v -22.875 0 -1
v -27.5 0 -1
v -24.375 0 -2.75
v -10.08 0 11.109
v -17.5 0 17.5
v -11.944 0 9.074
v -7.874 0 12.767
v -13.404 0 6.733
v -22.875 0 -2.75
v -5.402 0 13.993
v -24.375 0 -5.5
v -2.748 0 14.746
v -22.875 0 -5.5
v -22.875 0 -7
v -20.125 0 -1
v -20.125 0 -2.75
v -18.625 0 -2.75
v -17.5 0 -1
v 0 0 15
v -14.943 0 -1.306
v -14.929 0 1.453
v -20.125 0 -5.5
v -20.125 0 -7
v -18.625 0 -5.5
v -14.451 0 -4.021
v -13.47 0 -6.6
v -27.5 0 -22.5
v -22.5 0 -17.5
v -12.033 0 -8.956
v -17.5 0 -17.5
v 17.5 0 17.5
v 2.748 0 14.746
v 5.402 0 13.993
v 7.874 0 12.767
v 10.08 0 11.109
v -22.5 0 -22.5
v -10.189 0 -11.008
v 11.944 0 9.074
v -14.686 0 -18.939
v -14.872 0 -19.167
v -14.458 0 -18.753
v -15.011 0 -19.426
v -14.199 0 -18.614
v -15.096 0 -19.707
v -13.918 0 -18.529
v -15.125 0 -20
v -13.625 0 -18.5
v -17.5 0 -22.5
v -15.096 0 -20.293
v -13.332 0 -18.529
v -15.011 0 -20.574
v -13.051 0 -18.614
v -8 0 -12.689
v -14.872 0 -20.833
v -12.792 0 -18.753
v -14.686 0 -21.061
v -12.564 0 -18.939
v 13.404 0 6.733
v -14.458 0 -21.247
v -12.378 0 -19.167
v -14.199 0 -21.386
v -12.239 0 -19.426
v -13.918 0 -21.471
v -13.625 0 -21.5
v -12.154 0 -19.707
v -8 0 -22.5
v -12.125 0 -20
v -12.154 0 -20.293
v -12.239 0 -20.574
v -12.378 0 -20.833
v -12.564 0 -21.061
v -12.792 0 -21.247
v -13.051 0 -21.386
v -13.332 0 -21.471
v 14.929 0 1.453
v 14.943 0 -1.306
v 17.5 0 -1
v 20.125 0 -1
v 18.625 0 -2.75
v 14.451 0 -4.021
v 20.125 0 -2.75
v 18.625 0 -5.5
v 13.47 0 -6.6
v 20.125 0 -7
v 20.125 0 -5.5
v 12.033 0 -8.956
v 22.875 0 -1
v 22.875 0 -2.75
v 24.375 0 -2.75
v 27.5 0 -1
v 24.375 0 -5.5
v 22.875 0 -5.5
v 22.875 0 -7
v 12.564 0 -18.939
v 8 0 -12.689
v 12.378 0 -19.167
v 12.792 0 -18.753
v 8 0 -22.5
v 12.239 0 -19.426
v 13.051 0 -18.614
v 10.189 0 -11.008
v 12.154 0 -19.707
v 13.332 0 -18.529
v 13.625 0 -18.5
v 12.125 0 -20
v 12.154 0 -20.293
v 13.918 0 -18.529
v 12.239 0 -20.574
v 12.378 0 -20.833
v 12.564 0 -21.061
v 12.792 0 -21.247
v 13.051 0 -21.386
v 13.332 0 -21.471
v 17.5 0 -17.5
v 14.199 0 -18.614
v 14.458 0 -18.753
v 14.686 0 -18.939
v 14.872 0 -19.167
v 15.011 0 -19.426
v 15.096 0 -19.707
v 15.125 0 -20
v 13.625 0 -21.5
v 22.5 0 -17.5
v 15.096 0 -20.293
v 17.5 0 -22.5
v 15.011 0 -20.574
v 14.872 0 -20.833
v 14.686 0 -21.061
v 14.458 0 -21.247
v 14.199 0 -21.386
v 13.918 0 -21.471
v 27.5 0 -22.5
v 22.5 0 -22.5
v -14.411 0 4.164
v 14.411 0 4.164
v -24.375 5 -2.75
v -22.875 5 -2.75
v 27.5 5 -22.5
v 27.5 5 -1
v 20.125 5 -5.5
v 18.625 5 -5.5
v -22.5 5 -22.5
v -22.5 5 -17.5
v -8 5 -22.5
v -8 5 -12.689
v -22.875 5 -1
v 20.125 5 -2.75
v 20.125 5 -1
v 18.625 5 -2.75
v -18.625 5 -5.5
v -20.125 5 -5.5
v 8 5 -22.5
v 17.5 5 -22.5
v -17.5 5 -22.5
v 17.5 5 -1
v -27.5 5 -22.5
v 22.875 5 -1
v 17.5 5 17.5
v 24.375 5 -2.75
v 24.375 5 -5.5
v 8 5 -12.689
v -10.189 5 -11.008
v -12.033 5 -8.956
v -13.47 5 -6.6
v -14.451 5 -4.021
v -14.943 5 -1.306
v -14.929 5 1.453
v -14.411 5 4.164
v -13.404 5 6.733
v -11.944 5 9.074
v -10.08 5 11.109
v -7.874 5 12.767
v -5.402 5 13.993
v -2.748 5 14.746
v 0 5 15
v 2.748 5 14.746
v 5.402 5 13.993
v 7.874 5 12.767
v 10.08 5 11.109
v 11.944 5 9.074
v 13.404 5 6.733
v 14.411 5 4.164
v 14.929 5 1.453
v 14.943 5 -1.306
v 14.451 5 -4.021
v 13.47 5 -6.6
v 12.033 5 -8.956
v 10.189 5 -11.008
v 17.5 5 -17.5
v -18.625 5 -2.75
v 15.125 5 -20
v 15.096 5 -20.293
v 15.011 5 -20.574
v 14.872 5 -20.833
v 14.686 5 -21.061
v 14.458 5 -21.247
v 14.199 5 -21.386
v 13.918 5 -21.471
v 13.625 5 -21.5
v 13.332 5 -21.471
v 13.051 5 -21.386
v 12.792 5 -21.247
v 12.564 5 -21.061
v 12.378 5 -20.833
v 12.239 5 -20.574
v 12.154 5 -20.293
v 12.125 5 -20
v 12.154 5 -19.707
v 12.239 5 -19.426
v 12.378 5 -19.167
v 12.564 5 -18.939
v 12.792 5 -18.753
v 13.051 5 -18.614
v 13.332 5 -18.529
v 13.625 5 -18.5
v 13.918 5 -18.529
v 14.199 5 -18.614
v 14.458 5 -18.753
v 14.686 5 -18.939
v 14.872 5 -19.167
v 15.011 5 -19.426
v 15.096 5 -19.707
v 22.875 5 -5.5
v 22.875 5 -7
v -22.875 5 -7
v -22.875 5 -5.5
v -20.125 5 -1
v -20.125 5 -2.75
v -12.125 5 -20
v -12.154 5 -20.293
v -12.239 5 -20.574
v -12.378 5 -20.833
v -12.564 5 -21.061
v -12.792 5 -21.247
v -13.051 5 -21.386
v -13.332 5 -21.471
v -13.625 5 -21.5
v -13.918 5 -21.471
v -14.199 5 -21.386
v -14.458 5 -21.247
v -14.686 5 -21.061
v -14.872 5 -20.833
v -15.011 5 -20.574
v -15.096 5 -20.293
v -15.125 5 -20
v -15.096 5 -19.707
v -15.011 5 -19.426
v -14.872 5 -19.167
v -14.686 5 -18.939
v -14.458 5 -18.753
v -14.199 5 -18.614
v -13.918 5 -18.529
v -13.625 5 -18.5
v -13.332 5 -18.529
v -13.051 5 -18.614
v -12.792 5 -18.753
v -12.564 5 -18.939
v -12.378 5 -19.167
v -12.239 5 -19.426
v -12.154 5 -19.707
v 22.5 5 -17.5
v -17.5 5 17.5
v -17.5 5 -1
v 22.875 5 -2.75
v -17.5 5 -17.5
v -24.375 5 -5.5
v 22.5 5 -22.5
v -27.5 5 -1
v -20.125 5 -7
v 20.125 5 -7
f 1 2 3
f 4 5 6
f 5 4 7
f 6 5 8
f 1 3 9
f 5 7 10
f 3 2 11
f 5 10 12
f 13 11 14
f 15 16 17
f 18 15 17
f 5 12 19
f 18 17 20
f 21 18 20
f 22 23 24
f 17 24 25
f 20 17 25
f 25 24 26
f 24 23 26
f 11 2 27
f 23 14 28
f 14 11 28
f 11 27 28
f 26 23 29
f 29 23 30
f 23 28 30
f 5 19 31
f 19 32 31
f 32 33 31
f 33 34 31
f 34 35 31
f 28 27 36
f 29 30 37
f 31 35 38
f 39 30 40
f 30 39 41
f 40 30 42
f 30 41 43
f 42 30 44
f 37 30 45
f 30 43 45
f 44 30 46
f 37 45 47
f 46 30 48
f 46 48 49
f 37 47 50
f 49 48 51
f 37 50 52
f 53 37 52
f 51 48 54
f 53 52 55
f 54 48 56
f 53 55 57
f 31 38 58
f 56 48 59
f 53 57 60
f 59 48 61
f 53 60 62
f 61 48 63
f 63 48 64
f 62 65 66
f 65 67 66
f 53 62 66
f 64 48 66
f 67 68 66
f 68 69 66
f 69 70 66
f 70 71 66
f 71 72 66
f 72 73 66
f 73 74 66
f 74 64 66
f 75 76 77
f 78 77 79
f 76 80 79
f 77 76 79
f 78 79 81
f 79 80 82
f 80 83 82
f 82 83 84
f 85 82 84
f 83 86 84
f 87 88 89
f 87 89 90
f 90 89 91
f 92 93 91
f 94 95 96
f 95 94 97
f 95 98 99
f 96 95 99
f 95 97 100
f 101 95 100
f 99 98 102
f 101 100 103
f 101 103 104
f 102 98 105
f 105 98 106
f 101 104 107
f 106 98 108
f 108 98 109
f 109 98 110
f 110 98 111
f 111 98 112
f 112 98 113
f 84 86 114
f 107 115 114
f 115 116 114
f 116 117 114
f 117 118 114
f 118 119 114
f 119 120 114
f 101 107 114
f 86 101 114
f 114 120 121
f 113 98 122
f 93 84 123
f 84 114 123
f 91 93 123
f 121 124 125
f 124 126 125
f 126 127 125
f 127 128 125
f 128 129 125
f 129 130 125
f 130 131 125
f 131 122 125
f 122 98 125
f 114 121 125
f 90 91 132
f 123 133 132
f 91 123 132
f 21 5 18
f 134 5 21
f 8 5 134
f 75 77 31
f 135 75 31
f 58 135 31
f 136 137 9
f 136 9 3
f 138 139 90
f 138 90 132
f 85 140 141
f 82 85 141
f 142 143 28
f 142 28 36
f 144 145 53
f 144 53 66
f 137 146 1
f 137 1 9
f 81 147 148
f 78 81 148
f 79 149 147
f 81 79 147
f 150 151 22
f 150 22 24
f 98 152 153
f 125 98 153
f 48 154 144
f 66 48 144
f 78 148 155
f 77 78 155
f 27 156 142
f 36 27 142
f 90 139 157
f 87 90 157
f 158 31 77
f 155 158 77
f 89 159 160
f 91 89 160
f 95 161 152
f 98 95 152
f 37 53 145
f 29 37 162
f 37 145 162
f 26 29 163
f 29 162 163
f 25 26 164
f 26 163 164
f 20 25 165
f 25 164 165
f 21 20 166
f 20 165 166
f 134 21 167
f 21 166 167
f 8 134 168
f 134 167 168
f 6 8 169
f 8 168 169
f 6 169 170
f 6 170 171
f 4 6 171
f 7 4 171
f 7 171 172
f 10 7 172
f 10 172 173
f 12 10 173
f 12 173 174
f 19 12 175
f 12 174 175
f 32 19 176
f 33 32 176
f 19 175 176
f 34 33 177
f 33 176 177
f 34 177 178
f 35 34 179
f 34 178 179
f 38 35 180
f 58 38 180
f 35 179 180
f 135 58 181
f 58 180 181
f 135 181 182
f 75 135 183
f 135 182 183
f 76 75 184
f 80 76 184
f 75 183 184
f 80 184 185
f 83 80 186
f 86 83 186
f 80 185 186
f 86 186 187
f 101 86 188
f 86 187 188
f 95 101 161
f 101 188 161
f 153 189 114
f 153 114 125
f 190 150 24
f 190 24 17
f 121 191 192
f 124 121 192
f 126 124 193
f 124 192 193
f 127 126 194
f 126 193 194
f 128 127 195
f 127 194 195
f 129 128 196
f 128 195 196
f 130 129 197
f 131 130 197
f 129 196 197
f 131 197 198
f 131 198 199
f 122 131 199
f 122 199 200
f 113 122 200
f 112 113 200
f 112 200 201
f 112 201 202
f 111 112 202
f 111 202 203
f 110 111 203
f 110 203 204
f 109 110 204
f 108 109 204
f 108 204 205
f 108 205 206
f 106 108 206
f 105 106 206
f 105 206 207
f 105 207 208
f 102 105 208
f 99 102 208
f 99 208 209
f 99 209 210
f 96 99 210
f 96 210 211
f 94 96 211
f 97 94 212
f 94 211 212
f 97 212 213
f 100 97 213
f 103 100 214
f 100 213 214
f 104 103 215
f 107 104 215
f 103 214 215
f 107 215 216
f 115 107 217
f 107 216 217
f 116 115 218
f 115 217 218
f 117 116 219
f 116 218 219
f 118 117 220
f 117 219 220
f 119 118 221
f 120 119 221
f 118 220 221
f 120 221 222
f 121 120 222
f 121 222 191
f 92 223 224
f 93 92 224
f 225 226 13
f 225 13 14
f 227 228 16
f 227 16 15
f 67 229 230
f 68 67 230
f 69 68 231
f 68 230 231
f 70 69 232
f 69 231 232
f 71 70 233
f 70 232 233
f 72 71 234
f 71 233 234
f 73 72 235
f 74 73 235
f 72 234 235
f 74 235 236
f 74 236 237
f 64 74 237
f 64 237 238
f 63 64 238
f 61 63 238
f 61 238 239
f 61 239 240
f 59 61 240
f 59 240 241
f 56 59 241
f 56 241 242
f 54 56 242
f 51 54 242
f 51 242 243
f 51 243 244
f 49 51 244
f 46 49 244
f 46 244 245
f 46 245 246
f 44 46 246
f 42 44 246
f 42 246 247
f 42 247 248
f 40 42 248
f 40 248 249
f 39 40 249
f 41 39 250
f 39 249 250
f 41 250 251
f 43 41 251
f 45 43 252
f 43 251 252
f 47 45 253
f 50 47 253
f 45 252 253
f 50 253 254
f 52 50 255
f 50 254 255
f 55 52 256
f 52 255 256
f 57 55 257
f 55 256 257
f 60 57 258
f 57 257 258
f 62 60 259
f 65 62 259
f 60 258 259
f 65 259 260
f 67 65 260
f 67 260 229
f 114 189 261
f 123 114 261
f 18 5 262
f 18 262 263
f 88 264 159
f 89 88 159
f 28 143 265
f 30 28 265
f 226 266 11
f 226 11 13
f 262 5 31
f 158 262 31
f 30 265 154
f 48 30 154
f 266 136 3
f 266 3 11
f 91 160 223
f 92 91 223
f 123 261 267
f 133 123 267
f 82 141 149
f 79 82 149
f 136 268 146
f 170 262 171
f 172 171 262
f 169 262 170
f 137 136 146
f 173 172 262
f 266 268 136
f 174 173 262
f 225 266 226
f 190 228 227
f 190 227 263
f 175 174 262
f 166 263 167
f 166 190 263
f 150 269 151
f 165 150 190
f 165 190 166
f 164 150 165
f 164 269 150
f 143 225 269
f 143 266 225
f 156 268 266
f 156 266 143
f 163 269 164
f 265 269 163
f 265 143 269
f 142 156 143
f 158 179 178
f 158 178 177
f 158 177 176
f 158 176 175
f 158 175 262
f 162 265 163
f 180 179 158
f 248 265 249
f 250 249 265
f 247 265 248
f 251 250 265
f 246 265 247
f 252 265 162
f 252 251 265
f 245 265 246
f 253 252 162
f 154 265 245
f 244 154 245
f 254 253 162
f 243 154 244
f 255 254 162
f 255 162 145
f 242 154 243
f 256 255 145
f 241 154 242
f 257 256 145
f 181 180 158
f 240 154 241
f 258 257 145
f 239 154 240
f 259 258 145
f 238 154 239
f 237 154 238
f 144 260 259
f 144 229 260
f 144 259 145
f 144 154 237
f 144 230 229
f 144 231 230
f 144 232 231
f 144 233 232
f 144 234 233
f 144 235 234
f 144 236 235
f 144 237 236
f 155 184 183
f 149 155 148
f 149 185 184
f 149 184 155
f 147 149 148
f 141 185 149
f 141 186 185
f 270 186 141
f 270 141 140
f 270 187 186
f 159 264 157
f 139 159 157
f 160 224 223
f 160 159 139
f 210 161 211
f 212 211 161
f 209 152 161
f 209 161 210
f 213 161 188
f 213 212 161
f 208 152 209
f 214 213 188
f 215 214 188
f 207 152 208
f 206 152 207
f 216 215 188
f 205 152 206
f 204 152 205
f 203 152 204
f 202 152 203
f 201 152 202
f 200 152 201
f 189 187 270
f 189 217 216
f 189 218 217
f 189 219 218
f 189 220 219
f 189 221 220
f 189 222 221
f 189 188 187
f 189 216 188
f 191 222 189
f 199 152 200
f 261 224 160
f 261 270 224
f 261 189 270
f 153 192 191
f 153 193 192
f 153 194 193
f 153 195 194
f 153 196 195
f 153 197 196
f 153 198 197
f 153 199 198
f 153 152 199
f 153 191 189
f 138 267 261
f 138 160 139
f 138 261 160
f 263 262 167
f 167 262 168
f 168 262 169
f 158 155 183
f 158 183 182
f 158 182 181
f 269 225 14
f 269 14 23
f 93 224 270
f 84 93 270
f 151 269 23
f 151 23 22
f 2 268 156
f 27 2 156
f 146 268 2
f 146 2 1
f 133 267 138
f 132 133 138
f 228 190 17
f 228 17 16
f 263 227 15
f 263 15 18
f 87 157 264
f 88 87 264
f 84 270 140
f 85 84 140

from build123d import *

# Parameters (mm, degrees)
ESQUISSE1_W             = 35
ESQUISSE1_H             = 35
BOSS_EXTRU_1_DEPTH      = 5
ESQUISSE3_R             = 15
ENL_V_MAT_EXTRU_1_DEPTH = 5
ESQUISSE5_W             = 10
ESQUISSE5_H             = 16.5
BOSS_EXTRU_3_DEPTH      = 5
ENL_V_MAT_EXTRU_3_DEPTH = 10
ESQUISSE2_W             = 55
ESQUISSE2_H             = 5
BOSS_EXTRU_4_DEPTH      = 5
ESQUISSE8_W             = 16
ESQUISSE8_H             = 9.81142246
ENL_V_MAT_EXTRU_5_DEPTH = 5
ESQUISSE9_W             = 5
ESQUISSE9_H             = 5
ENL_V_MAT_EXTRU_6_DEPTH = 5
ESQUISSE10_R            = 1.5
ENL_V_MAT_EXTRU_7_DEPTH = 6


with BuildPart() as part:
    # Esquisse1 → Boss.-Extru.1 (new body)
    with BuildSketch(Plane(origin=(0, 0, 0), x_dir=(1, 0, 0), z_dir=(0, 1, 0))):
        Rectangle(ESQUISSE1_W, ESQUISSE1_H)
    extrude(amount=BOSS_EXTRU_1_DEPTH)

    # Esquisse3 → Enlèv. mat.-Extru.1 (cut)
    with BuildSketch(Plane(origin=(0, 5, 0), x_dir=(1, 0, 0), z_dir=(0, 1, 0))):
        Circle(ESQUISSE3_R)
    extrude(amount=-ENL_V_MAT_EXTRU_1_DEPTH, mode=Mode.SUBTRACT)

    # Esquisse5 → Boss.-Extru.3 (add)
    with BuildSketch(Plane(origin=(0, 5, 0), x_dir=(1, 0, 0), z_dir=(0, 1, 0))):
        with Locations((-22.5, 9.25)):
            Rectangle(ESQUISSE5_W, ESQUISSE5_H)
    boss_extru_3 = extrude(amount=-BOSS_EXTRU_3_DEPTH)

    # Symétrie1: Boss.-Extru.3 across plane
    add(boss_extru_3.mirror(Plane(origin=(0, 0, 0), x_dir=(0, 0, 1), z_dir=(1, 0, 0))))

    # Esquisse7 → Enlèv. mat.-Extru.3 (cut)
    with BuildSketch(Plane(origin=(0, 5, 0), x_dir=(1, 0, 0), z_dir=(0, 1, 0))):
        Polygon((-22.875, 1), (-22.875, 2.75), (-24.375, 2.75), (-24.375, 5.5), (-22.875, 5.5), (-22.875, 7), (-20.125, 7), (-20.125, 5.5), (-18.625, 5.5), (-18.625, 2.75), (-20.125, 2.75), (-20.125, 1), align=None)
    enl_v_mat_extru_3 = extrude(amount=-ENL_V_MAT_EXTRU_3_DEPTH, mode=Mode.SUBTRACT)

    # Symétrie2: Enlèv. mat.-Extru.3 across plane
    add(enl_v_mat_extru_3.mirror(Plane(origin=(0, 0, 0), x_dir=(0, 0, 1), z_dir=(1, 0, 0))), mode=Mode.SUBTRACT)

    # Esquisse2 → Boss.-Extru.4 (add)
    with BuildSketch(Plane(origin=(0, 5, 0), x_dir=(1, 0, 0), z_dir=(0, 1, 0))):
        with Locations((0, 20)):
            Rectangle(ESQUISSE2_W, ESQUISSE2_H)
    extrude(amount=-BOSS_EXTRU_4_DEPTH)

    # Esquisse8 → Enlèv. mat.-Extru.5 (cut)
    with BuildSketch(Plane(origin=(0, 5, 0), x_dir=(1, 0, 0), z_dir=(0, 1, 0))):
        with Locations((0, 17.59428877)):
            Rectangle(ESQUISSE8_W, ESQUISSE8_H)
    extrude(amount=-ENL_V_MAT_EXTRU_5_DEPTH, mode=Mode.SUBTRACT)

    # Esquisse9 → Enlèv. mat.-Extru.6 (cut)
    with BuildSketch(Plane(origin=(0, 5, 0), x_dir=(1, 0, 0), z_dir=(0, 1, 0))):
        with Locations((-20, 20)):
            Rectangle(ESQUISSE9_W, ESQUISSE9_H)
        with Locations((20, 20)):
            Rectangle(ESQUISSE9_W, ESQUISSE9_H)
    extrude(amount=-ENL_V_MAT_EXTRU_6_DEPTH, mode=Mode.SUBTRACT)

    # Esquisse10 → Enlèv. mat.-Extru.7 (cut, through all)
    with BuildSketch(Plane(origin=(0, 5, 0), x_dir=(1, 0, 0), z_dir=(0, 1, 0))):
        with Locations((-13.625, 20)):
            Circle(ESQUISSE10_R)
        with Locations((13.625, 20)):
            Circle(ESQUISSE10_R)
    extrude(amount=-ENL_V_MAT_EXTRU_7_DEPTH, mode=Mode.SUBTRACT)


solid = part.part
